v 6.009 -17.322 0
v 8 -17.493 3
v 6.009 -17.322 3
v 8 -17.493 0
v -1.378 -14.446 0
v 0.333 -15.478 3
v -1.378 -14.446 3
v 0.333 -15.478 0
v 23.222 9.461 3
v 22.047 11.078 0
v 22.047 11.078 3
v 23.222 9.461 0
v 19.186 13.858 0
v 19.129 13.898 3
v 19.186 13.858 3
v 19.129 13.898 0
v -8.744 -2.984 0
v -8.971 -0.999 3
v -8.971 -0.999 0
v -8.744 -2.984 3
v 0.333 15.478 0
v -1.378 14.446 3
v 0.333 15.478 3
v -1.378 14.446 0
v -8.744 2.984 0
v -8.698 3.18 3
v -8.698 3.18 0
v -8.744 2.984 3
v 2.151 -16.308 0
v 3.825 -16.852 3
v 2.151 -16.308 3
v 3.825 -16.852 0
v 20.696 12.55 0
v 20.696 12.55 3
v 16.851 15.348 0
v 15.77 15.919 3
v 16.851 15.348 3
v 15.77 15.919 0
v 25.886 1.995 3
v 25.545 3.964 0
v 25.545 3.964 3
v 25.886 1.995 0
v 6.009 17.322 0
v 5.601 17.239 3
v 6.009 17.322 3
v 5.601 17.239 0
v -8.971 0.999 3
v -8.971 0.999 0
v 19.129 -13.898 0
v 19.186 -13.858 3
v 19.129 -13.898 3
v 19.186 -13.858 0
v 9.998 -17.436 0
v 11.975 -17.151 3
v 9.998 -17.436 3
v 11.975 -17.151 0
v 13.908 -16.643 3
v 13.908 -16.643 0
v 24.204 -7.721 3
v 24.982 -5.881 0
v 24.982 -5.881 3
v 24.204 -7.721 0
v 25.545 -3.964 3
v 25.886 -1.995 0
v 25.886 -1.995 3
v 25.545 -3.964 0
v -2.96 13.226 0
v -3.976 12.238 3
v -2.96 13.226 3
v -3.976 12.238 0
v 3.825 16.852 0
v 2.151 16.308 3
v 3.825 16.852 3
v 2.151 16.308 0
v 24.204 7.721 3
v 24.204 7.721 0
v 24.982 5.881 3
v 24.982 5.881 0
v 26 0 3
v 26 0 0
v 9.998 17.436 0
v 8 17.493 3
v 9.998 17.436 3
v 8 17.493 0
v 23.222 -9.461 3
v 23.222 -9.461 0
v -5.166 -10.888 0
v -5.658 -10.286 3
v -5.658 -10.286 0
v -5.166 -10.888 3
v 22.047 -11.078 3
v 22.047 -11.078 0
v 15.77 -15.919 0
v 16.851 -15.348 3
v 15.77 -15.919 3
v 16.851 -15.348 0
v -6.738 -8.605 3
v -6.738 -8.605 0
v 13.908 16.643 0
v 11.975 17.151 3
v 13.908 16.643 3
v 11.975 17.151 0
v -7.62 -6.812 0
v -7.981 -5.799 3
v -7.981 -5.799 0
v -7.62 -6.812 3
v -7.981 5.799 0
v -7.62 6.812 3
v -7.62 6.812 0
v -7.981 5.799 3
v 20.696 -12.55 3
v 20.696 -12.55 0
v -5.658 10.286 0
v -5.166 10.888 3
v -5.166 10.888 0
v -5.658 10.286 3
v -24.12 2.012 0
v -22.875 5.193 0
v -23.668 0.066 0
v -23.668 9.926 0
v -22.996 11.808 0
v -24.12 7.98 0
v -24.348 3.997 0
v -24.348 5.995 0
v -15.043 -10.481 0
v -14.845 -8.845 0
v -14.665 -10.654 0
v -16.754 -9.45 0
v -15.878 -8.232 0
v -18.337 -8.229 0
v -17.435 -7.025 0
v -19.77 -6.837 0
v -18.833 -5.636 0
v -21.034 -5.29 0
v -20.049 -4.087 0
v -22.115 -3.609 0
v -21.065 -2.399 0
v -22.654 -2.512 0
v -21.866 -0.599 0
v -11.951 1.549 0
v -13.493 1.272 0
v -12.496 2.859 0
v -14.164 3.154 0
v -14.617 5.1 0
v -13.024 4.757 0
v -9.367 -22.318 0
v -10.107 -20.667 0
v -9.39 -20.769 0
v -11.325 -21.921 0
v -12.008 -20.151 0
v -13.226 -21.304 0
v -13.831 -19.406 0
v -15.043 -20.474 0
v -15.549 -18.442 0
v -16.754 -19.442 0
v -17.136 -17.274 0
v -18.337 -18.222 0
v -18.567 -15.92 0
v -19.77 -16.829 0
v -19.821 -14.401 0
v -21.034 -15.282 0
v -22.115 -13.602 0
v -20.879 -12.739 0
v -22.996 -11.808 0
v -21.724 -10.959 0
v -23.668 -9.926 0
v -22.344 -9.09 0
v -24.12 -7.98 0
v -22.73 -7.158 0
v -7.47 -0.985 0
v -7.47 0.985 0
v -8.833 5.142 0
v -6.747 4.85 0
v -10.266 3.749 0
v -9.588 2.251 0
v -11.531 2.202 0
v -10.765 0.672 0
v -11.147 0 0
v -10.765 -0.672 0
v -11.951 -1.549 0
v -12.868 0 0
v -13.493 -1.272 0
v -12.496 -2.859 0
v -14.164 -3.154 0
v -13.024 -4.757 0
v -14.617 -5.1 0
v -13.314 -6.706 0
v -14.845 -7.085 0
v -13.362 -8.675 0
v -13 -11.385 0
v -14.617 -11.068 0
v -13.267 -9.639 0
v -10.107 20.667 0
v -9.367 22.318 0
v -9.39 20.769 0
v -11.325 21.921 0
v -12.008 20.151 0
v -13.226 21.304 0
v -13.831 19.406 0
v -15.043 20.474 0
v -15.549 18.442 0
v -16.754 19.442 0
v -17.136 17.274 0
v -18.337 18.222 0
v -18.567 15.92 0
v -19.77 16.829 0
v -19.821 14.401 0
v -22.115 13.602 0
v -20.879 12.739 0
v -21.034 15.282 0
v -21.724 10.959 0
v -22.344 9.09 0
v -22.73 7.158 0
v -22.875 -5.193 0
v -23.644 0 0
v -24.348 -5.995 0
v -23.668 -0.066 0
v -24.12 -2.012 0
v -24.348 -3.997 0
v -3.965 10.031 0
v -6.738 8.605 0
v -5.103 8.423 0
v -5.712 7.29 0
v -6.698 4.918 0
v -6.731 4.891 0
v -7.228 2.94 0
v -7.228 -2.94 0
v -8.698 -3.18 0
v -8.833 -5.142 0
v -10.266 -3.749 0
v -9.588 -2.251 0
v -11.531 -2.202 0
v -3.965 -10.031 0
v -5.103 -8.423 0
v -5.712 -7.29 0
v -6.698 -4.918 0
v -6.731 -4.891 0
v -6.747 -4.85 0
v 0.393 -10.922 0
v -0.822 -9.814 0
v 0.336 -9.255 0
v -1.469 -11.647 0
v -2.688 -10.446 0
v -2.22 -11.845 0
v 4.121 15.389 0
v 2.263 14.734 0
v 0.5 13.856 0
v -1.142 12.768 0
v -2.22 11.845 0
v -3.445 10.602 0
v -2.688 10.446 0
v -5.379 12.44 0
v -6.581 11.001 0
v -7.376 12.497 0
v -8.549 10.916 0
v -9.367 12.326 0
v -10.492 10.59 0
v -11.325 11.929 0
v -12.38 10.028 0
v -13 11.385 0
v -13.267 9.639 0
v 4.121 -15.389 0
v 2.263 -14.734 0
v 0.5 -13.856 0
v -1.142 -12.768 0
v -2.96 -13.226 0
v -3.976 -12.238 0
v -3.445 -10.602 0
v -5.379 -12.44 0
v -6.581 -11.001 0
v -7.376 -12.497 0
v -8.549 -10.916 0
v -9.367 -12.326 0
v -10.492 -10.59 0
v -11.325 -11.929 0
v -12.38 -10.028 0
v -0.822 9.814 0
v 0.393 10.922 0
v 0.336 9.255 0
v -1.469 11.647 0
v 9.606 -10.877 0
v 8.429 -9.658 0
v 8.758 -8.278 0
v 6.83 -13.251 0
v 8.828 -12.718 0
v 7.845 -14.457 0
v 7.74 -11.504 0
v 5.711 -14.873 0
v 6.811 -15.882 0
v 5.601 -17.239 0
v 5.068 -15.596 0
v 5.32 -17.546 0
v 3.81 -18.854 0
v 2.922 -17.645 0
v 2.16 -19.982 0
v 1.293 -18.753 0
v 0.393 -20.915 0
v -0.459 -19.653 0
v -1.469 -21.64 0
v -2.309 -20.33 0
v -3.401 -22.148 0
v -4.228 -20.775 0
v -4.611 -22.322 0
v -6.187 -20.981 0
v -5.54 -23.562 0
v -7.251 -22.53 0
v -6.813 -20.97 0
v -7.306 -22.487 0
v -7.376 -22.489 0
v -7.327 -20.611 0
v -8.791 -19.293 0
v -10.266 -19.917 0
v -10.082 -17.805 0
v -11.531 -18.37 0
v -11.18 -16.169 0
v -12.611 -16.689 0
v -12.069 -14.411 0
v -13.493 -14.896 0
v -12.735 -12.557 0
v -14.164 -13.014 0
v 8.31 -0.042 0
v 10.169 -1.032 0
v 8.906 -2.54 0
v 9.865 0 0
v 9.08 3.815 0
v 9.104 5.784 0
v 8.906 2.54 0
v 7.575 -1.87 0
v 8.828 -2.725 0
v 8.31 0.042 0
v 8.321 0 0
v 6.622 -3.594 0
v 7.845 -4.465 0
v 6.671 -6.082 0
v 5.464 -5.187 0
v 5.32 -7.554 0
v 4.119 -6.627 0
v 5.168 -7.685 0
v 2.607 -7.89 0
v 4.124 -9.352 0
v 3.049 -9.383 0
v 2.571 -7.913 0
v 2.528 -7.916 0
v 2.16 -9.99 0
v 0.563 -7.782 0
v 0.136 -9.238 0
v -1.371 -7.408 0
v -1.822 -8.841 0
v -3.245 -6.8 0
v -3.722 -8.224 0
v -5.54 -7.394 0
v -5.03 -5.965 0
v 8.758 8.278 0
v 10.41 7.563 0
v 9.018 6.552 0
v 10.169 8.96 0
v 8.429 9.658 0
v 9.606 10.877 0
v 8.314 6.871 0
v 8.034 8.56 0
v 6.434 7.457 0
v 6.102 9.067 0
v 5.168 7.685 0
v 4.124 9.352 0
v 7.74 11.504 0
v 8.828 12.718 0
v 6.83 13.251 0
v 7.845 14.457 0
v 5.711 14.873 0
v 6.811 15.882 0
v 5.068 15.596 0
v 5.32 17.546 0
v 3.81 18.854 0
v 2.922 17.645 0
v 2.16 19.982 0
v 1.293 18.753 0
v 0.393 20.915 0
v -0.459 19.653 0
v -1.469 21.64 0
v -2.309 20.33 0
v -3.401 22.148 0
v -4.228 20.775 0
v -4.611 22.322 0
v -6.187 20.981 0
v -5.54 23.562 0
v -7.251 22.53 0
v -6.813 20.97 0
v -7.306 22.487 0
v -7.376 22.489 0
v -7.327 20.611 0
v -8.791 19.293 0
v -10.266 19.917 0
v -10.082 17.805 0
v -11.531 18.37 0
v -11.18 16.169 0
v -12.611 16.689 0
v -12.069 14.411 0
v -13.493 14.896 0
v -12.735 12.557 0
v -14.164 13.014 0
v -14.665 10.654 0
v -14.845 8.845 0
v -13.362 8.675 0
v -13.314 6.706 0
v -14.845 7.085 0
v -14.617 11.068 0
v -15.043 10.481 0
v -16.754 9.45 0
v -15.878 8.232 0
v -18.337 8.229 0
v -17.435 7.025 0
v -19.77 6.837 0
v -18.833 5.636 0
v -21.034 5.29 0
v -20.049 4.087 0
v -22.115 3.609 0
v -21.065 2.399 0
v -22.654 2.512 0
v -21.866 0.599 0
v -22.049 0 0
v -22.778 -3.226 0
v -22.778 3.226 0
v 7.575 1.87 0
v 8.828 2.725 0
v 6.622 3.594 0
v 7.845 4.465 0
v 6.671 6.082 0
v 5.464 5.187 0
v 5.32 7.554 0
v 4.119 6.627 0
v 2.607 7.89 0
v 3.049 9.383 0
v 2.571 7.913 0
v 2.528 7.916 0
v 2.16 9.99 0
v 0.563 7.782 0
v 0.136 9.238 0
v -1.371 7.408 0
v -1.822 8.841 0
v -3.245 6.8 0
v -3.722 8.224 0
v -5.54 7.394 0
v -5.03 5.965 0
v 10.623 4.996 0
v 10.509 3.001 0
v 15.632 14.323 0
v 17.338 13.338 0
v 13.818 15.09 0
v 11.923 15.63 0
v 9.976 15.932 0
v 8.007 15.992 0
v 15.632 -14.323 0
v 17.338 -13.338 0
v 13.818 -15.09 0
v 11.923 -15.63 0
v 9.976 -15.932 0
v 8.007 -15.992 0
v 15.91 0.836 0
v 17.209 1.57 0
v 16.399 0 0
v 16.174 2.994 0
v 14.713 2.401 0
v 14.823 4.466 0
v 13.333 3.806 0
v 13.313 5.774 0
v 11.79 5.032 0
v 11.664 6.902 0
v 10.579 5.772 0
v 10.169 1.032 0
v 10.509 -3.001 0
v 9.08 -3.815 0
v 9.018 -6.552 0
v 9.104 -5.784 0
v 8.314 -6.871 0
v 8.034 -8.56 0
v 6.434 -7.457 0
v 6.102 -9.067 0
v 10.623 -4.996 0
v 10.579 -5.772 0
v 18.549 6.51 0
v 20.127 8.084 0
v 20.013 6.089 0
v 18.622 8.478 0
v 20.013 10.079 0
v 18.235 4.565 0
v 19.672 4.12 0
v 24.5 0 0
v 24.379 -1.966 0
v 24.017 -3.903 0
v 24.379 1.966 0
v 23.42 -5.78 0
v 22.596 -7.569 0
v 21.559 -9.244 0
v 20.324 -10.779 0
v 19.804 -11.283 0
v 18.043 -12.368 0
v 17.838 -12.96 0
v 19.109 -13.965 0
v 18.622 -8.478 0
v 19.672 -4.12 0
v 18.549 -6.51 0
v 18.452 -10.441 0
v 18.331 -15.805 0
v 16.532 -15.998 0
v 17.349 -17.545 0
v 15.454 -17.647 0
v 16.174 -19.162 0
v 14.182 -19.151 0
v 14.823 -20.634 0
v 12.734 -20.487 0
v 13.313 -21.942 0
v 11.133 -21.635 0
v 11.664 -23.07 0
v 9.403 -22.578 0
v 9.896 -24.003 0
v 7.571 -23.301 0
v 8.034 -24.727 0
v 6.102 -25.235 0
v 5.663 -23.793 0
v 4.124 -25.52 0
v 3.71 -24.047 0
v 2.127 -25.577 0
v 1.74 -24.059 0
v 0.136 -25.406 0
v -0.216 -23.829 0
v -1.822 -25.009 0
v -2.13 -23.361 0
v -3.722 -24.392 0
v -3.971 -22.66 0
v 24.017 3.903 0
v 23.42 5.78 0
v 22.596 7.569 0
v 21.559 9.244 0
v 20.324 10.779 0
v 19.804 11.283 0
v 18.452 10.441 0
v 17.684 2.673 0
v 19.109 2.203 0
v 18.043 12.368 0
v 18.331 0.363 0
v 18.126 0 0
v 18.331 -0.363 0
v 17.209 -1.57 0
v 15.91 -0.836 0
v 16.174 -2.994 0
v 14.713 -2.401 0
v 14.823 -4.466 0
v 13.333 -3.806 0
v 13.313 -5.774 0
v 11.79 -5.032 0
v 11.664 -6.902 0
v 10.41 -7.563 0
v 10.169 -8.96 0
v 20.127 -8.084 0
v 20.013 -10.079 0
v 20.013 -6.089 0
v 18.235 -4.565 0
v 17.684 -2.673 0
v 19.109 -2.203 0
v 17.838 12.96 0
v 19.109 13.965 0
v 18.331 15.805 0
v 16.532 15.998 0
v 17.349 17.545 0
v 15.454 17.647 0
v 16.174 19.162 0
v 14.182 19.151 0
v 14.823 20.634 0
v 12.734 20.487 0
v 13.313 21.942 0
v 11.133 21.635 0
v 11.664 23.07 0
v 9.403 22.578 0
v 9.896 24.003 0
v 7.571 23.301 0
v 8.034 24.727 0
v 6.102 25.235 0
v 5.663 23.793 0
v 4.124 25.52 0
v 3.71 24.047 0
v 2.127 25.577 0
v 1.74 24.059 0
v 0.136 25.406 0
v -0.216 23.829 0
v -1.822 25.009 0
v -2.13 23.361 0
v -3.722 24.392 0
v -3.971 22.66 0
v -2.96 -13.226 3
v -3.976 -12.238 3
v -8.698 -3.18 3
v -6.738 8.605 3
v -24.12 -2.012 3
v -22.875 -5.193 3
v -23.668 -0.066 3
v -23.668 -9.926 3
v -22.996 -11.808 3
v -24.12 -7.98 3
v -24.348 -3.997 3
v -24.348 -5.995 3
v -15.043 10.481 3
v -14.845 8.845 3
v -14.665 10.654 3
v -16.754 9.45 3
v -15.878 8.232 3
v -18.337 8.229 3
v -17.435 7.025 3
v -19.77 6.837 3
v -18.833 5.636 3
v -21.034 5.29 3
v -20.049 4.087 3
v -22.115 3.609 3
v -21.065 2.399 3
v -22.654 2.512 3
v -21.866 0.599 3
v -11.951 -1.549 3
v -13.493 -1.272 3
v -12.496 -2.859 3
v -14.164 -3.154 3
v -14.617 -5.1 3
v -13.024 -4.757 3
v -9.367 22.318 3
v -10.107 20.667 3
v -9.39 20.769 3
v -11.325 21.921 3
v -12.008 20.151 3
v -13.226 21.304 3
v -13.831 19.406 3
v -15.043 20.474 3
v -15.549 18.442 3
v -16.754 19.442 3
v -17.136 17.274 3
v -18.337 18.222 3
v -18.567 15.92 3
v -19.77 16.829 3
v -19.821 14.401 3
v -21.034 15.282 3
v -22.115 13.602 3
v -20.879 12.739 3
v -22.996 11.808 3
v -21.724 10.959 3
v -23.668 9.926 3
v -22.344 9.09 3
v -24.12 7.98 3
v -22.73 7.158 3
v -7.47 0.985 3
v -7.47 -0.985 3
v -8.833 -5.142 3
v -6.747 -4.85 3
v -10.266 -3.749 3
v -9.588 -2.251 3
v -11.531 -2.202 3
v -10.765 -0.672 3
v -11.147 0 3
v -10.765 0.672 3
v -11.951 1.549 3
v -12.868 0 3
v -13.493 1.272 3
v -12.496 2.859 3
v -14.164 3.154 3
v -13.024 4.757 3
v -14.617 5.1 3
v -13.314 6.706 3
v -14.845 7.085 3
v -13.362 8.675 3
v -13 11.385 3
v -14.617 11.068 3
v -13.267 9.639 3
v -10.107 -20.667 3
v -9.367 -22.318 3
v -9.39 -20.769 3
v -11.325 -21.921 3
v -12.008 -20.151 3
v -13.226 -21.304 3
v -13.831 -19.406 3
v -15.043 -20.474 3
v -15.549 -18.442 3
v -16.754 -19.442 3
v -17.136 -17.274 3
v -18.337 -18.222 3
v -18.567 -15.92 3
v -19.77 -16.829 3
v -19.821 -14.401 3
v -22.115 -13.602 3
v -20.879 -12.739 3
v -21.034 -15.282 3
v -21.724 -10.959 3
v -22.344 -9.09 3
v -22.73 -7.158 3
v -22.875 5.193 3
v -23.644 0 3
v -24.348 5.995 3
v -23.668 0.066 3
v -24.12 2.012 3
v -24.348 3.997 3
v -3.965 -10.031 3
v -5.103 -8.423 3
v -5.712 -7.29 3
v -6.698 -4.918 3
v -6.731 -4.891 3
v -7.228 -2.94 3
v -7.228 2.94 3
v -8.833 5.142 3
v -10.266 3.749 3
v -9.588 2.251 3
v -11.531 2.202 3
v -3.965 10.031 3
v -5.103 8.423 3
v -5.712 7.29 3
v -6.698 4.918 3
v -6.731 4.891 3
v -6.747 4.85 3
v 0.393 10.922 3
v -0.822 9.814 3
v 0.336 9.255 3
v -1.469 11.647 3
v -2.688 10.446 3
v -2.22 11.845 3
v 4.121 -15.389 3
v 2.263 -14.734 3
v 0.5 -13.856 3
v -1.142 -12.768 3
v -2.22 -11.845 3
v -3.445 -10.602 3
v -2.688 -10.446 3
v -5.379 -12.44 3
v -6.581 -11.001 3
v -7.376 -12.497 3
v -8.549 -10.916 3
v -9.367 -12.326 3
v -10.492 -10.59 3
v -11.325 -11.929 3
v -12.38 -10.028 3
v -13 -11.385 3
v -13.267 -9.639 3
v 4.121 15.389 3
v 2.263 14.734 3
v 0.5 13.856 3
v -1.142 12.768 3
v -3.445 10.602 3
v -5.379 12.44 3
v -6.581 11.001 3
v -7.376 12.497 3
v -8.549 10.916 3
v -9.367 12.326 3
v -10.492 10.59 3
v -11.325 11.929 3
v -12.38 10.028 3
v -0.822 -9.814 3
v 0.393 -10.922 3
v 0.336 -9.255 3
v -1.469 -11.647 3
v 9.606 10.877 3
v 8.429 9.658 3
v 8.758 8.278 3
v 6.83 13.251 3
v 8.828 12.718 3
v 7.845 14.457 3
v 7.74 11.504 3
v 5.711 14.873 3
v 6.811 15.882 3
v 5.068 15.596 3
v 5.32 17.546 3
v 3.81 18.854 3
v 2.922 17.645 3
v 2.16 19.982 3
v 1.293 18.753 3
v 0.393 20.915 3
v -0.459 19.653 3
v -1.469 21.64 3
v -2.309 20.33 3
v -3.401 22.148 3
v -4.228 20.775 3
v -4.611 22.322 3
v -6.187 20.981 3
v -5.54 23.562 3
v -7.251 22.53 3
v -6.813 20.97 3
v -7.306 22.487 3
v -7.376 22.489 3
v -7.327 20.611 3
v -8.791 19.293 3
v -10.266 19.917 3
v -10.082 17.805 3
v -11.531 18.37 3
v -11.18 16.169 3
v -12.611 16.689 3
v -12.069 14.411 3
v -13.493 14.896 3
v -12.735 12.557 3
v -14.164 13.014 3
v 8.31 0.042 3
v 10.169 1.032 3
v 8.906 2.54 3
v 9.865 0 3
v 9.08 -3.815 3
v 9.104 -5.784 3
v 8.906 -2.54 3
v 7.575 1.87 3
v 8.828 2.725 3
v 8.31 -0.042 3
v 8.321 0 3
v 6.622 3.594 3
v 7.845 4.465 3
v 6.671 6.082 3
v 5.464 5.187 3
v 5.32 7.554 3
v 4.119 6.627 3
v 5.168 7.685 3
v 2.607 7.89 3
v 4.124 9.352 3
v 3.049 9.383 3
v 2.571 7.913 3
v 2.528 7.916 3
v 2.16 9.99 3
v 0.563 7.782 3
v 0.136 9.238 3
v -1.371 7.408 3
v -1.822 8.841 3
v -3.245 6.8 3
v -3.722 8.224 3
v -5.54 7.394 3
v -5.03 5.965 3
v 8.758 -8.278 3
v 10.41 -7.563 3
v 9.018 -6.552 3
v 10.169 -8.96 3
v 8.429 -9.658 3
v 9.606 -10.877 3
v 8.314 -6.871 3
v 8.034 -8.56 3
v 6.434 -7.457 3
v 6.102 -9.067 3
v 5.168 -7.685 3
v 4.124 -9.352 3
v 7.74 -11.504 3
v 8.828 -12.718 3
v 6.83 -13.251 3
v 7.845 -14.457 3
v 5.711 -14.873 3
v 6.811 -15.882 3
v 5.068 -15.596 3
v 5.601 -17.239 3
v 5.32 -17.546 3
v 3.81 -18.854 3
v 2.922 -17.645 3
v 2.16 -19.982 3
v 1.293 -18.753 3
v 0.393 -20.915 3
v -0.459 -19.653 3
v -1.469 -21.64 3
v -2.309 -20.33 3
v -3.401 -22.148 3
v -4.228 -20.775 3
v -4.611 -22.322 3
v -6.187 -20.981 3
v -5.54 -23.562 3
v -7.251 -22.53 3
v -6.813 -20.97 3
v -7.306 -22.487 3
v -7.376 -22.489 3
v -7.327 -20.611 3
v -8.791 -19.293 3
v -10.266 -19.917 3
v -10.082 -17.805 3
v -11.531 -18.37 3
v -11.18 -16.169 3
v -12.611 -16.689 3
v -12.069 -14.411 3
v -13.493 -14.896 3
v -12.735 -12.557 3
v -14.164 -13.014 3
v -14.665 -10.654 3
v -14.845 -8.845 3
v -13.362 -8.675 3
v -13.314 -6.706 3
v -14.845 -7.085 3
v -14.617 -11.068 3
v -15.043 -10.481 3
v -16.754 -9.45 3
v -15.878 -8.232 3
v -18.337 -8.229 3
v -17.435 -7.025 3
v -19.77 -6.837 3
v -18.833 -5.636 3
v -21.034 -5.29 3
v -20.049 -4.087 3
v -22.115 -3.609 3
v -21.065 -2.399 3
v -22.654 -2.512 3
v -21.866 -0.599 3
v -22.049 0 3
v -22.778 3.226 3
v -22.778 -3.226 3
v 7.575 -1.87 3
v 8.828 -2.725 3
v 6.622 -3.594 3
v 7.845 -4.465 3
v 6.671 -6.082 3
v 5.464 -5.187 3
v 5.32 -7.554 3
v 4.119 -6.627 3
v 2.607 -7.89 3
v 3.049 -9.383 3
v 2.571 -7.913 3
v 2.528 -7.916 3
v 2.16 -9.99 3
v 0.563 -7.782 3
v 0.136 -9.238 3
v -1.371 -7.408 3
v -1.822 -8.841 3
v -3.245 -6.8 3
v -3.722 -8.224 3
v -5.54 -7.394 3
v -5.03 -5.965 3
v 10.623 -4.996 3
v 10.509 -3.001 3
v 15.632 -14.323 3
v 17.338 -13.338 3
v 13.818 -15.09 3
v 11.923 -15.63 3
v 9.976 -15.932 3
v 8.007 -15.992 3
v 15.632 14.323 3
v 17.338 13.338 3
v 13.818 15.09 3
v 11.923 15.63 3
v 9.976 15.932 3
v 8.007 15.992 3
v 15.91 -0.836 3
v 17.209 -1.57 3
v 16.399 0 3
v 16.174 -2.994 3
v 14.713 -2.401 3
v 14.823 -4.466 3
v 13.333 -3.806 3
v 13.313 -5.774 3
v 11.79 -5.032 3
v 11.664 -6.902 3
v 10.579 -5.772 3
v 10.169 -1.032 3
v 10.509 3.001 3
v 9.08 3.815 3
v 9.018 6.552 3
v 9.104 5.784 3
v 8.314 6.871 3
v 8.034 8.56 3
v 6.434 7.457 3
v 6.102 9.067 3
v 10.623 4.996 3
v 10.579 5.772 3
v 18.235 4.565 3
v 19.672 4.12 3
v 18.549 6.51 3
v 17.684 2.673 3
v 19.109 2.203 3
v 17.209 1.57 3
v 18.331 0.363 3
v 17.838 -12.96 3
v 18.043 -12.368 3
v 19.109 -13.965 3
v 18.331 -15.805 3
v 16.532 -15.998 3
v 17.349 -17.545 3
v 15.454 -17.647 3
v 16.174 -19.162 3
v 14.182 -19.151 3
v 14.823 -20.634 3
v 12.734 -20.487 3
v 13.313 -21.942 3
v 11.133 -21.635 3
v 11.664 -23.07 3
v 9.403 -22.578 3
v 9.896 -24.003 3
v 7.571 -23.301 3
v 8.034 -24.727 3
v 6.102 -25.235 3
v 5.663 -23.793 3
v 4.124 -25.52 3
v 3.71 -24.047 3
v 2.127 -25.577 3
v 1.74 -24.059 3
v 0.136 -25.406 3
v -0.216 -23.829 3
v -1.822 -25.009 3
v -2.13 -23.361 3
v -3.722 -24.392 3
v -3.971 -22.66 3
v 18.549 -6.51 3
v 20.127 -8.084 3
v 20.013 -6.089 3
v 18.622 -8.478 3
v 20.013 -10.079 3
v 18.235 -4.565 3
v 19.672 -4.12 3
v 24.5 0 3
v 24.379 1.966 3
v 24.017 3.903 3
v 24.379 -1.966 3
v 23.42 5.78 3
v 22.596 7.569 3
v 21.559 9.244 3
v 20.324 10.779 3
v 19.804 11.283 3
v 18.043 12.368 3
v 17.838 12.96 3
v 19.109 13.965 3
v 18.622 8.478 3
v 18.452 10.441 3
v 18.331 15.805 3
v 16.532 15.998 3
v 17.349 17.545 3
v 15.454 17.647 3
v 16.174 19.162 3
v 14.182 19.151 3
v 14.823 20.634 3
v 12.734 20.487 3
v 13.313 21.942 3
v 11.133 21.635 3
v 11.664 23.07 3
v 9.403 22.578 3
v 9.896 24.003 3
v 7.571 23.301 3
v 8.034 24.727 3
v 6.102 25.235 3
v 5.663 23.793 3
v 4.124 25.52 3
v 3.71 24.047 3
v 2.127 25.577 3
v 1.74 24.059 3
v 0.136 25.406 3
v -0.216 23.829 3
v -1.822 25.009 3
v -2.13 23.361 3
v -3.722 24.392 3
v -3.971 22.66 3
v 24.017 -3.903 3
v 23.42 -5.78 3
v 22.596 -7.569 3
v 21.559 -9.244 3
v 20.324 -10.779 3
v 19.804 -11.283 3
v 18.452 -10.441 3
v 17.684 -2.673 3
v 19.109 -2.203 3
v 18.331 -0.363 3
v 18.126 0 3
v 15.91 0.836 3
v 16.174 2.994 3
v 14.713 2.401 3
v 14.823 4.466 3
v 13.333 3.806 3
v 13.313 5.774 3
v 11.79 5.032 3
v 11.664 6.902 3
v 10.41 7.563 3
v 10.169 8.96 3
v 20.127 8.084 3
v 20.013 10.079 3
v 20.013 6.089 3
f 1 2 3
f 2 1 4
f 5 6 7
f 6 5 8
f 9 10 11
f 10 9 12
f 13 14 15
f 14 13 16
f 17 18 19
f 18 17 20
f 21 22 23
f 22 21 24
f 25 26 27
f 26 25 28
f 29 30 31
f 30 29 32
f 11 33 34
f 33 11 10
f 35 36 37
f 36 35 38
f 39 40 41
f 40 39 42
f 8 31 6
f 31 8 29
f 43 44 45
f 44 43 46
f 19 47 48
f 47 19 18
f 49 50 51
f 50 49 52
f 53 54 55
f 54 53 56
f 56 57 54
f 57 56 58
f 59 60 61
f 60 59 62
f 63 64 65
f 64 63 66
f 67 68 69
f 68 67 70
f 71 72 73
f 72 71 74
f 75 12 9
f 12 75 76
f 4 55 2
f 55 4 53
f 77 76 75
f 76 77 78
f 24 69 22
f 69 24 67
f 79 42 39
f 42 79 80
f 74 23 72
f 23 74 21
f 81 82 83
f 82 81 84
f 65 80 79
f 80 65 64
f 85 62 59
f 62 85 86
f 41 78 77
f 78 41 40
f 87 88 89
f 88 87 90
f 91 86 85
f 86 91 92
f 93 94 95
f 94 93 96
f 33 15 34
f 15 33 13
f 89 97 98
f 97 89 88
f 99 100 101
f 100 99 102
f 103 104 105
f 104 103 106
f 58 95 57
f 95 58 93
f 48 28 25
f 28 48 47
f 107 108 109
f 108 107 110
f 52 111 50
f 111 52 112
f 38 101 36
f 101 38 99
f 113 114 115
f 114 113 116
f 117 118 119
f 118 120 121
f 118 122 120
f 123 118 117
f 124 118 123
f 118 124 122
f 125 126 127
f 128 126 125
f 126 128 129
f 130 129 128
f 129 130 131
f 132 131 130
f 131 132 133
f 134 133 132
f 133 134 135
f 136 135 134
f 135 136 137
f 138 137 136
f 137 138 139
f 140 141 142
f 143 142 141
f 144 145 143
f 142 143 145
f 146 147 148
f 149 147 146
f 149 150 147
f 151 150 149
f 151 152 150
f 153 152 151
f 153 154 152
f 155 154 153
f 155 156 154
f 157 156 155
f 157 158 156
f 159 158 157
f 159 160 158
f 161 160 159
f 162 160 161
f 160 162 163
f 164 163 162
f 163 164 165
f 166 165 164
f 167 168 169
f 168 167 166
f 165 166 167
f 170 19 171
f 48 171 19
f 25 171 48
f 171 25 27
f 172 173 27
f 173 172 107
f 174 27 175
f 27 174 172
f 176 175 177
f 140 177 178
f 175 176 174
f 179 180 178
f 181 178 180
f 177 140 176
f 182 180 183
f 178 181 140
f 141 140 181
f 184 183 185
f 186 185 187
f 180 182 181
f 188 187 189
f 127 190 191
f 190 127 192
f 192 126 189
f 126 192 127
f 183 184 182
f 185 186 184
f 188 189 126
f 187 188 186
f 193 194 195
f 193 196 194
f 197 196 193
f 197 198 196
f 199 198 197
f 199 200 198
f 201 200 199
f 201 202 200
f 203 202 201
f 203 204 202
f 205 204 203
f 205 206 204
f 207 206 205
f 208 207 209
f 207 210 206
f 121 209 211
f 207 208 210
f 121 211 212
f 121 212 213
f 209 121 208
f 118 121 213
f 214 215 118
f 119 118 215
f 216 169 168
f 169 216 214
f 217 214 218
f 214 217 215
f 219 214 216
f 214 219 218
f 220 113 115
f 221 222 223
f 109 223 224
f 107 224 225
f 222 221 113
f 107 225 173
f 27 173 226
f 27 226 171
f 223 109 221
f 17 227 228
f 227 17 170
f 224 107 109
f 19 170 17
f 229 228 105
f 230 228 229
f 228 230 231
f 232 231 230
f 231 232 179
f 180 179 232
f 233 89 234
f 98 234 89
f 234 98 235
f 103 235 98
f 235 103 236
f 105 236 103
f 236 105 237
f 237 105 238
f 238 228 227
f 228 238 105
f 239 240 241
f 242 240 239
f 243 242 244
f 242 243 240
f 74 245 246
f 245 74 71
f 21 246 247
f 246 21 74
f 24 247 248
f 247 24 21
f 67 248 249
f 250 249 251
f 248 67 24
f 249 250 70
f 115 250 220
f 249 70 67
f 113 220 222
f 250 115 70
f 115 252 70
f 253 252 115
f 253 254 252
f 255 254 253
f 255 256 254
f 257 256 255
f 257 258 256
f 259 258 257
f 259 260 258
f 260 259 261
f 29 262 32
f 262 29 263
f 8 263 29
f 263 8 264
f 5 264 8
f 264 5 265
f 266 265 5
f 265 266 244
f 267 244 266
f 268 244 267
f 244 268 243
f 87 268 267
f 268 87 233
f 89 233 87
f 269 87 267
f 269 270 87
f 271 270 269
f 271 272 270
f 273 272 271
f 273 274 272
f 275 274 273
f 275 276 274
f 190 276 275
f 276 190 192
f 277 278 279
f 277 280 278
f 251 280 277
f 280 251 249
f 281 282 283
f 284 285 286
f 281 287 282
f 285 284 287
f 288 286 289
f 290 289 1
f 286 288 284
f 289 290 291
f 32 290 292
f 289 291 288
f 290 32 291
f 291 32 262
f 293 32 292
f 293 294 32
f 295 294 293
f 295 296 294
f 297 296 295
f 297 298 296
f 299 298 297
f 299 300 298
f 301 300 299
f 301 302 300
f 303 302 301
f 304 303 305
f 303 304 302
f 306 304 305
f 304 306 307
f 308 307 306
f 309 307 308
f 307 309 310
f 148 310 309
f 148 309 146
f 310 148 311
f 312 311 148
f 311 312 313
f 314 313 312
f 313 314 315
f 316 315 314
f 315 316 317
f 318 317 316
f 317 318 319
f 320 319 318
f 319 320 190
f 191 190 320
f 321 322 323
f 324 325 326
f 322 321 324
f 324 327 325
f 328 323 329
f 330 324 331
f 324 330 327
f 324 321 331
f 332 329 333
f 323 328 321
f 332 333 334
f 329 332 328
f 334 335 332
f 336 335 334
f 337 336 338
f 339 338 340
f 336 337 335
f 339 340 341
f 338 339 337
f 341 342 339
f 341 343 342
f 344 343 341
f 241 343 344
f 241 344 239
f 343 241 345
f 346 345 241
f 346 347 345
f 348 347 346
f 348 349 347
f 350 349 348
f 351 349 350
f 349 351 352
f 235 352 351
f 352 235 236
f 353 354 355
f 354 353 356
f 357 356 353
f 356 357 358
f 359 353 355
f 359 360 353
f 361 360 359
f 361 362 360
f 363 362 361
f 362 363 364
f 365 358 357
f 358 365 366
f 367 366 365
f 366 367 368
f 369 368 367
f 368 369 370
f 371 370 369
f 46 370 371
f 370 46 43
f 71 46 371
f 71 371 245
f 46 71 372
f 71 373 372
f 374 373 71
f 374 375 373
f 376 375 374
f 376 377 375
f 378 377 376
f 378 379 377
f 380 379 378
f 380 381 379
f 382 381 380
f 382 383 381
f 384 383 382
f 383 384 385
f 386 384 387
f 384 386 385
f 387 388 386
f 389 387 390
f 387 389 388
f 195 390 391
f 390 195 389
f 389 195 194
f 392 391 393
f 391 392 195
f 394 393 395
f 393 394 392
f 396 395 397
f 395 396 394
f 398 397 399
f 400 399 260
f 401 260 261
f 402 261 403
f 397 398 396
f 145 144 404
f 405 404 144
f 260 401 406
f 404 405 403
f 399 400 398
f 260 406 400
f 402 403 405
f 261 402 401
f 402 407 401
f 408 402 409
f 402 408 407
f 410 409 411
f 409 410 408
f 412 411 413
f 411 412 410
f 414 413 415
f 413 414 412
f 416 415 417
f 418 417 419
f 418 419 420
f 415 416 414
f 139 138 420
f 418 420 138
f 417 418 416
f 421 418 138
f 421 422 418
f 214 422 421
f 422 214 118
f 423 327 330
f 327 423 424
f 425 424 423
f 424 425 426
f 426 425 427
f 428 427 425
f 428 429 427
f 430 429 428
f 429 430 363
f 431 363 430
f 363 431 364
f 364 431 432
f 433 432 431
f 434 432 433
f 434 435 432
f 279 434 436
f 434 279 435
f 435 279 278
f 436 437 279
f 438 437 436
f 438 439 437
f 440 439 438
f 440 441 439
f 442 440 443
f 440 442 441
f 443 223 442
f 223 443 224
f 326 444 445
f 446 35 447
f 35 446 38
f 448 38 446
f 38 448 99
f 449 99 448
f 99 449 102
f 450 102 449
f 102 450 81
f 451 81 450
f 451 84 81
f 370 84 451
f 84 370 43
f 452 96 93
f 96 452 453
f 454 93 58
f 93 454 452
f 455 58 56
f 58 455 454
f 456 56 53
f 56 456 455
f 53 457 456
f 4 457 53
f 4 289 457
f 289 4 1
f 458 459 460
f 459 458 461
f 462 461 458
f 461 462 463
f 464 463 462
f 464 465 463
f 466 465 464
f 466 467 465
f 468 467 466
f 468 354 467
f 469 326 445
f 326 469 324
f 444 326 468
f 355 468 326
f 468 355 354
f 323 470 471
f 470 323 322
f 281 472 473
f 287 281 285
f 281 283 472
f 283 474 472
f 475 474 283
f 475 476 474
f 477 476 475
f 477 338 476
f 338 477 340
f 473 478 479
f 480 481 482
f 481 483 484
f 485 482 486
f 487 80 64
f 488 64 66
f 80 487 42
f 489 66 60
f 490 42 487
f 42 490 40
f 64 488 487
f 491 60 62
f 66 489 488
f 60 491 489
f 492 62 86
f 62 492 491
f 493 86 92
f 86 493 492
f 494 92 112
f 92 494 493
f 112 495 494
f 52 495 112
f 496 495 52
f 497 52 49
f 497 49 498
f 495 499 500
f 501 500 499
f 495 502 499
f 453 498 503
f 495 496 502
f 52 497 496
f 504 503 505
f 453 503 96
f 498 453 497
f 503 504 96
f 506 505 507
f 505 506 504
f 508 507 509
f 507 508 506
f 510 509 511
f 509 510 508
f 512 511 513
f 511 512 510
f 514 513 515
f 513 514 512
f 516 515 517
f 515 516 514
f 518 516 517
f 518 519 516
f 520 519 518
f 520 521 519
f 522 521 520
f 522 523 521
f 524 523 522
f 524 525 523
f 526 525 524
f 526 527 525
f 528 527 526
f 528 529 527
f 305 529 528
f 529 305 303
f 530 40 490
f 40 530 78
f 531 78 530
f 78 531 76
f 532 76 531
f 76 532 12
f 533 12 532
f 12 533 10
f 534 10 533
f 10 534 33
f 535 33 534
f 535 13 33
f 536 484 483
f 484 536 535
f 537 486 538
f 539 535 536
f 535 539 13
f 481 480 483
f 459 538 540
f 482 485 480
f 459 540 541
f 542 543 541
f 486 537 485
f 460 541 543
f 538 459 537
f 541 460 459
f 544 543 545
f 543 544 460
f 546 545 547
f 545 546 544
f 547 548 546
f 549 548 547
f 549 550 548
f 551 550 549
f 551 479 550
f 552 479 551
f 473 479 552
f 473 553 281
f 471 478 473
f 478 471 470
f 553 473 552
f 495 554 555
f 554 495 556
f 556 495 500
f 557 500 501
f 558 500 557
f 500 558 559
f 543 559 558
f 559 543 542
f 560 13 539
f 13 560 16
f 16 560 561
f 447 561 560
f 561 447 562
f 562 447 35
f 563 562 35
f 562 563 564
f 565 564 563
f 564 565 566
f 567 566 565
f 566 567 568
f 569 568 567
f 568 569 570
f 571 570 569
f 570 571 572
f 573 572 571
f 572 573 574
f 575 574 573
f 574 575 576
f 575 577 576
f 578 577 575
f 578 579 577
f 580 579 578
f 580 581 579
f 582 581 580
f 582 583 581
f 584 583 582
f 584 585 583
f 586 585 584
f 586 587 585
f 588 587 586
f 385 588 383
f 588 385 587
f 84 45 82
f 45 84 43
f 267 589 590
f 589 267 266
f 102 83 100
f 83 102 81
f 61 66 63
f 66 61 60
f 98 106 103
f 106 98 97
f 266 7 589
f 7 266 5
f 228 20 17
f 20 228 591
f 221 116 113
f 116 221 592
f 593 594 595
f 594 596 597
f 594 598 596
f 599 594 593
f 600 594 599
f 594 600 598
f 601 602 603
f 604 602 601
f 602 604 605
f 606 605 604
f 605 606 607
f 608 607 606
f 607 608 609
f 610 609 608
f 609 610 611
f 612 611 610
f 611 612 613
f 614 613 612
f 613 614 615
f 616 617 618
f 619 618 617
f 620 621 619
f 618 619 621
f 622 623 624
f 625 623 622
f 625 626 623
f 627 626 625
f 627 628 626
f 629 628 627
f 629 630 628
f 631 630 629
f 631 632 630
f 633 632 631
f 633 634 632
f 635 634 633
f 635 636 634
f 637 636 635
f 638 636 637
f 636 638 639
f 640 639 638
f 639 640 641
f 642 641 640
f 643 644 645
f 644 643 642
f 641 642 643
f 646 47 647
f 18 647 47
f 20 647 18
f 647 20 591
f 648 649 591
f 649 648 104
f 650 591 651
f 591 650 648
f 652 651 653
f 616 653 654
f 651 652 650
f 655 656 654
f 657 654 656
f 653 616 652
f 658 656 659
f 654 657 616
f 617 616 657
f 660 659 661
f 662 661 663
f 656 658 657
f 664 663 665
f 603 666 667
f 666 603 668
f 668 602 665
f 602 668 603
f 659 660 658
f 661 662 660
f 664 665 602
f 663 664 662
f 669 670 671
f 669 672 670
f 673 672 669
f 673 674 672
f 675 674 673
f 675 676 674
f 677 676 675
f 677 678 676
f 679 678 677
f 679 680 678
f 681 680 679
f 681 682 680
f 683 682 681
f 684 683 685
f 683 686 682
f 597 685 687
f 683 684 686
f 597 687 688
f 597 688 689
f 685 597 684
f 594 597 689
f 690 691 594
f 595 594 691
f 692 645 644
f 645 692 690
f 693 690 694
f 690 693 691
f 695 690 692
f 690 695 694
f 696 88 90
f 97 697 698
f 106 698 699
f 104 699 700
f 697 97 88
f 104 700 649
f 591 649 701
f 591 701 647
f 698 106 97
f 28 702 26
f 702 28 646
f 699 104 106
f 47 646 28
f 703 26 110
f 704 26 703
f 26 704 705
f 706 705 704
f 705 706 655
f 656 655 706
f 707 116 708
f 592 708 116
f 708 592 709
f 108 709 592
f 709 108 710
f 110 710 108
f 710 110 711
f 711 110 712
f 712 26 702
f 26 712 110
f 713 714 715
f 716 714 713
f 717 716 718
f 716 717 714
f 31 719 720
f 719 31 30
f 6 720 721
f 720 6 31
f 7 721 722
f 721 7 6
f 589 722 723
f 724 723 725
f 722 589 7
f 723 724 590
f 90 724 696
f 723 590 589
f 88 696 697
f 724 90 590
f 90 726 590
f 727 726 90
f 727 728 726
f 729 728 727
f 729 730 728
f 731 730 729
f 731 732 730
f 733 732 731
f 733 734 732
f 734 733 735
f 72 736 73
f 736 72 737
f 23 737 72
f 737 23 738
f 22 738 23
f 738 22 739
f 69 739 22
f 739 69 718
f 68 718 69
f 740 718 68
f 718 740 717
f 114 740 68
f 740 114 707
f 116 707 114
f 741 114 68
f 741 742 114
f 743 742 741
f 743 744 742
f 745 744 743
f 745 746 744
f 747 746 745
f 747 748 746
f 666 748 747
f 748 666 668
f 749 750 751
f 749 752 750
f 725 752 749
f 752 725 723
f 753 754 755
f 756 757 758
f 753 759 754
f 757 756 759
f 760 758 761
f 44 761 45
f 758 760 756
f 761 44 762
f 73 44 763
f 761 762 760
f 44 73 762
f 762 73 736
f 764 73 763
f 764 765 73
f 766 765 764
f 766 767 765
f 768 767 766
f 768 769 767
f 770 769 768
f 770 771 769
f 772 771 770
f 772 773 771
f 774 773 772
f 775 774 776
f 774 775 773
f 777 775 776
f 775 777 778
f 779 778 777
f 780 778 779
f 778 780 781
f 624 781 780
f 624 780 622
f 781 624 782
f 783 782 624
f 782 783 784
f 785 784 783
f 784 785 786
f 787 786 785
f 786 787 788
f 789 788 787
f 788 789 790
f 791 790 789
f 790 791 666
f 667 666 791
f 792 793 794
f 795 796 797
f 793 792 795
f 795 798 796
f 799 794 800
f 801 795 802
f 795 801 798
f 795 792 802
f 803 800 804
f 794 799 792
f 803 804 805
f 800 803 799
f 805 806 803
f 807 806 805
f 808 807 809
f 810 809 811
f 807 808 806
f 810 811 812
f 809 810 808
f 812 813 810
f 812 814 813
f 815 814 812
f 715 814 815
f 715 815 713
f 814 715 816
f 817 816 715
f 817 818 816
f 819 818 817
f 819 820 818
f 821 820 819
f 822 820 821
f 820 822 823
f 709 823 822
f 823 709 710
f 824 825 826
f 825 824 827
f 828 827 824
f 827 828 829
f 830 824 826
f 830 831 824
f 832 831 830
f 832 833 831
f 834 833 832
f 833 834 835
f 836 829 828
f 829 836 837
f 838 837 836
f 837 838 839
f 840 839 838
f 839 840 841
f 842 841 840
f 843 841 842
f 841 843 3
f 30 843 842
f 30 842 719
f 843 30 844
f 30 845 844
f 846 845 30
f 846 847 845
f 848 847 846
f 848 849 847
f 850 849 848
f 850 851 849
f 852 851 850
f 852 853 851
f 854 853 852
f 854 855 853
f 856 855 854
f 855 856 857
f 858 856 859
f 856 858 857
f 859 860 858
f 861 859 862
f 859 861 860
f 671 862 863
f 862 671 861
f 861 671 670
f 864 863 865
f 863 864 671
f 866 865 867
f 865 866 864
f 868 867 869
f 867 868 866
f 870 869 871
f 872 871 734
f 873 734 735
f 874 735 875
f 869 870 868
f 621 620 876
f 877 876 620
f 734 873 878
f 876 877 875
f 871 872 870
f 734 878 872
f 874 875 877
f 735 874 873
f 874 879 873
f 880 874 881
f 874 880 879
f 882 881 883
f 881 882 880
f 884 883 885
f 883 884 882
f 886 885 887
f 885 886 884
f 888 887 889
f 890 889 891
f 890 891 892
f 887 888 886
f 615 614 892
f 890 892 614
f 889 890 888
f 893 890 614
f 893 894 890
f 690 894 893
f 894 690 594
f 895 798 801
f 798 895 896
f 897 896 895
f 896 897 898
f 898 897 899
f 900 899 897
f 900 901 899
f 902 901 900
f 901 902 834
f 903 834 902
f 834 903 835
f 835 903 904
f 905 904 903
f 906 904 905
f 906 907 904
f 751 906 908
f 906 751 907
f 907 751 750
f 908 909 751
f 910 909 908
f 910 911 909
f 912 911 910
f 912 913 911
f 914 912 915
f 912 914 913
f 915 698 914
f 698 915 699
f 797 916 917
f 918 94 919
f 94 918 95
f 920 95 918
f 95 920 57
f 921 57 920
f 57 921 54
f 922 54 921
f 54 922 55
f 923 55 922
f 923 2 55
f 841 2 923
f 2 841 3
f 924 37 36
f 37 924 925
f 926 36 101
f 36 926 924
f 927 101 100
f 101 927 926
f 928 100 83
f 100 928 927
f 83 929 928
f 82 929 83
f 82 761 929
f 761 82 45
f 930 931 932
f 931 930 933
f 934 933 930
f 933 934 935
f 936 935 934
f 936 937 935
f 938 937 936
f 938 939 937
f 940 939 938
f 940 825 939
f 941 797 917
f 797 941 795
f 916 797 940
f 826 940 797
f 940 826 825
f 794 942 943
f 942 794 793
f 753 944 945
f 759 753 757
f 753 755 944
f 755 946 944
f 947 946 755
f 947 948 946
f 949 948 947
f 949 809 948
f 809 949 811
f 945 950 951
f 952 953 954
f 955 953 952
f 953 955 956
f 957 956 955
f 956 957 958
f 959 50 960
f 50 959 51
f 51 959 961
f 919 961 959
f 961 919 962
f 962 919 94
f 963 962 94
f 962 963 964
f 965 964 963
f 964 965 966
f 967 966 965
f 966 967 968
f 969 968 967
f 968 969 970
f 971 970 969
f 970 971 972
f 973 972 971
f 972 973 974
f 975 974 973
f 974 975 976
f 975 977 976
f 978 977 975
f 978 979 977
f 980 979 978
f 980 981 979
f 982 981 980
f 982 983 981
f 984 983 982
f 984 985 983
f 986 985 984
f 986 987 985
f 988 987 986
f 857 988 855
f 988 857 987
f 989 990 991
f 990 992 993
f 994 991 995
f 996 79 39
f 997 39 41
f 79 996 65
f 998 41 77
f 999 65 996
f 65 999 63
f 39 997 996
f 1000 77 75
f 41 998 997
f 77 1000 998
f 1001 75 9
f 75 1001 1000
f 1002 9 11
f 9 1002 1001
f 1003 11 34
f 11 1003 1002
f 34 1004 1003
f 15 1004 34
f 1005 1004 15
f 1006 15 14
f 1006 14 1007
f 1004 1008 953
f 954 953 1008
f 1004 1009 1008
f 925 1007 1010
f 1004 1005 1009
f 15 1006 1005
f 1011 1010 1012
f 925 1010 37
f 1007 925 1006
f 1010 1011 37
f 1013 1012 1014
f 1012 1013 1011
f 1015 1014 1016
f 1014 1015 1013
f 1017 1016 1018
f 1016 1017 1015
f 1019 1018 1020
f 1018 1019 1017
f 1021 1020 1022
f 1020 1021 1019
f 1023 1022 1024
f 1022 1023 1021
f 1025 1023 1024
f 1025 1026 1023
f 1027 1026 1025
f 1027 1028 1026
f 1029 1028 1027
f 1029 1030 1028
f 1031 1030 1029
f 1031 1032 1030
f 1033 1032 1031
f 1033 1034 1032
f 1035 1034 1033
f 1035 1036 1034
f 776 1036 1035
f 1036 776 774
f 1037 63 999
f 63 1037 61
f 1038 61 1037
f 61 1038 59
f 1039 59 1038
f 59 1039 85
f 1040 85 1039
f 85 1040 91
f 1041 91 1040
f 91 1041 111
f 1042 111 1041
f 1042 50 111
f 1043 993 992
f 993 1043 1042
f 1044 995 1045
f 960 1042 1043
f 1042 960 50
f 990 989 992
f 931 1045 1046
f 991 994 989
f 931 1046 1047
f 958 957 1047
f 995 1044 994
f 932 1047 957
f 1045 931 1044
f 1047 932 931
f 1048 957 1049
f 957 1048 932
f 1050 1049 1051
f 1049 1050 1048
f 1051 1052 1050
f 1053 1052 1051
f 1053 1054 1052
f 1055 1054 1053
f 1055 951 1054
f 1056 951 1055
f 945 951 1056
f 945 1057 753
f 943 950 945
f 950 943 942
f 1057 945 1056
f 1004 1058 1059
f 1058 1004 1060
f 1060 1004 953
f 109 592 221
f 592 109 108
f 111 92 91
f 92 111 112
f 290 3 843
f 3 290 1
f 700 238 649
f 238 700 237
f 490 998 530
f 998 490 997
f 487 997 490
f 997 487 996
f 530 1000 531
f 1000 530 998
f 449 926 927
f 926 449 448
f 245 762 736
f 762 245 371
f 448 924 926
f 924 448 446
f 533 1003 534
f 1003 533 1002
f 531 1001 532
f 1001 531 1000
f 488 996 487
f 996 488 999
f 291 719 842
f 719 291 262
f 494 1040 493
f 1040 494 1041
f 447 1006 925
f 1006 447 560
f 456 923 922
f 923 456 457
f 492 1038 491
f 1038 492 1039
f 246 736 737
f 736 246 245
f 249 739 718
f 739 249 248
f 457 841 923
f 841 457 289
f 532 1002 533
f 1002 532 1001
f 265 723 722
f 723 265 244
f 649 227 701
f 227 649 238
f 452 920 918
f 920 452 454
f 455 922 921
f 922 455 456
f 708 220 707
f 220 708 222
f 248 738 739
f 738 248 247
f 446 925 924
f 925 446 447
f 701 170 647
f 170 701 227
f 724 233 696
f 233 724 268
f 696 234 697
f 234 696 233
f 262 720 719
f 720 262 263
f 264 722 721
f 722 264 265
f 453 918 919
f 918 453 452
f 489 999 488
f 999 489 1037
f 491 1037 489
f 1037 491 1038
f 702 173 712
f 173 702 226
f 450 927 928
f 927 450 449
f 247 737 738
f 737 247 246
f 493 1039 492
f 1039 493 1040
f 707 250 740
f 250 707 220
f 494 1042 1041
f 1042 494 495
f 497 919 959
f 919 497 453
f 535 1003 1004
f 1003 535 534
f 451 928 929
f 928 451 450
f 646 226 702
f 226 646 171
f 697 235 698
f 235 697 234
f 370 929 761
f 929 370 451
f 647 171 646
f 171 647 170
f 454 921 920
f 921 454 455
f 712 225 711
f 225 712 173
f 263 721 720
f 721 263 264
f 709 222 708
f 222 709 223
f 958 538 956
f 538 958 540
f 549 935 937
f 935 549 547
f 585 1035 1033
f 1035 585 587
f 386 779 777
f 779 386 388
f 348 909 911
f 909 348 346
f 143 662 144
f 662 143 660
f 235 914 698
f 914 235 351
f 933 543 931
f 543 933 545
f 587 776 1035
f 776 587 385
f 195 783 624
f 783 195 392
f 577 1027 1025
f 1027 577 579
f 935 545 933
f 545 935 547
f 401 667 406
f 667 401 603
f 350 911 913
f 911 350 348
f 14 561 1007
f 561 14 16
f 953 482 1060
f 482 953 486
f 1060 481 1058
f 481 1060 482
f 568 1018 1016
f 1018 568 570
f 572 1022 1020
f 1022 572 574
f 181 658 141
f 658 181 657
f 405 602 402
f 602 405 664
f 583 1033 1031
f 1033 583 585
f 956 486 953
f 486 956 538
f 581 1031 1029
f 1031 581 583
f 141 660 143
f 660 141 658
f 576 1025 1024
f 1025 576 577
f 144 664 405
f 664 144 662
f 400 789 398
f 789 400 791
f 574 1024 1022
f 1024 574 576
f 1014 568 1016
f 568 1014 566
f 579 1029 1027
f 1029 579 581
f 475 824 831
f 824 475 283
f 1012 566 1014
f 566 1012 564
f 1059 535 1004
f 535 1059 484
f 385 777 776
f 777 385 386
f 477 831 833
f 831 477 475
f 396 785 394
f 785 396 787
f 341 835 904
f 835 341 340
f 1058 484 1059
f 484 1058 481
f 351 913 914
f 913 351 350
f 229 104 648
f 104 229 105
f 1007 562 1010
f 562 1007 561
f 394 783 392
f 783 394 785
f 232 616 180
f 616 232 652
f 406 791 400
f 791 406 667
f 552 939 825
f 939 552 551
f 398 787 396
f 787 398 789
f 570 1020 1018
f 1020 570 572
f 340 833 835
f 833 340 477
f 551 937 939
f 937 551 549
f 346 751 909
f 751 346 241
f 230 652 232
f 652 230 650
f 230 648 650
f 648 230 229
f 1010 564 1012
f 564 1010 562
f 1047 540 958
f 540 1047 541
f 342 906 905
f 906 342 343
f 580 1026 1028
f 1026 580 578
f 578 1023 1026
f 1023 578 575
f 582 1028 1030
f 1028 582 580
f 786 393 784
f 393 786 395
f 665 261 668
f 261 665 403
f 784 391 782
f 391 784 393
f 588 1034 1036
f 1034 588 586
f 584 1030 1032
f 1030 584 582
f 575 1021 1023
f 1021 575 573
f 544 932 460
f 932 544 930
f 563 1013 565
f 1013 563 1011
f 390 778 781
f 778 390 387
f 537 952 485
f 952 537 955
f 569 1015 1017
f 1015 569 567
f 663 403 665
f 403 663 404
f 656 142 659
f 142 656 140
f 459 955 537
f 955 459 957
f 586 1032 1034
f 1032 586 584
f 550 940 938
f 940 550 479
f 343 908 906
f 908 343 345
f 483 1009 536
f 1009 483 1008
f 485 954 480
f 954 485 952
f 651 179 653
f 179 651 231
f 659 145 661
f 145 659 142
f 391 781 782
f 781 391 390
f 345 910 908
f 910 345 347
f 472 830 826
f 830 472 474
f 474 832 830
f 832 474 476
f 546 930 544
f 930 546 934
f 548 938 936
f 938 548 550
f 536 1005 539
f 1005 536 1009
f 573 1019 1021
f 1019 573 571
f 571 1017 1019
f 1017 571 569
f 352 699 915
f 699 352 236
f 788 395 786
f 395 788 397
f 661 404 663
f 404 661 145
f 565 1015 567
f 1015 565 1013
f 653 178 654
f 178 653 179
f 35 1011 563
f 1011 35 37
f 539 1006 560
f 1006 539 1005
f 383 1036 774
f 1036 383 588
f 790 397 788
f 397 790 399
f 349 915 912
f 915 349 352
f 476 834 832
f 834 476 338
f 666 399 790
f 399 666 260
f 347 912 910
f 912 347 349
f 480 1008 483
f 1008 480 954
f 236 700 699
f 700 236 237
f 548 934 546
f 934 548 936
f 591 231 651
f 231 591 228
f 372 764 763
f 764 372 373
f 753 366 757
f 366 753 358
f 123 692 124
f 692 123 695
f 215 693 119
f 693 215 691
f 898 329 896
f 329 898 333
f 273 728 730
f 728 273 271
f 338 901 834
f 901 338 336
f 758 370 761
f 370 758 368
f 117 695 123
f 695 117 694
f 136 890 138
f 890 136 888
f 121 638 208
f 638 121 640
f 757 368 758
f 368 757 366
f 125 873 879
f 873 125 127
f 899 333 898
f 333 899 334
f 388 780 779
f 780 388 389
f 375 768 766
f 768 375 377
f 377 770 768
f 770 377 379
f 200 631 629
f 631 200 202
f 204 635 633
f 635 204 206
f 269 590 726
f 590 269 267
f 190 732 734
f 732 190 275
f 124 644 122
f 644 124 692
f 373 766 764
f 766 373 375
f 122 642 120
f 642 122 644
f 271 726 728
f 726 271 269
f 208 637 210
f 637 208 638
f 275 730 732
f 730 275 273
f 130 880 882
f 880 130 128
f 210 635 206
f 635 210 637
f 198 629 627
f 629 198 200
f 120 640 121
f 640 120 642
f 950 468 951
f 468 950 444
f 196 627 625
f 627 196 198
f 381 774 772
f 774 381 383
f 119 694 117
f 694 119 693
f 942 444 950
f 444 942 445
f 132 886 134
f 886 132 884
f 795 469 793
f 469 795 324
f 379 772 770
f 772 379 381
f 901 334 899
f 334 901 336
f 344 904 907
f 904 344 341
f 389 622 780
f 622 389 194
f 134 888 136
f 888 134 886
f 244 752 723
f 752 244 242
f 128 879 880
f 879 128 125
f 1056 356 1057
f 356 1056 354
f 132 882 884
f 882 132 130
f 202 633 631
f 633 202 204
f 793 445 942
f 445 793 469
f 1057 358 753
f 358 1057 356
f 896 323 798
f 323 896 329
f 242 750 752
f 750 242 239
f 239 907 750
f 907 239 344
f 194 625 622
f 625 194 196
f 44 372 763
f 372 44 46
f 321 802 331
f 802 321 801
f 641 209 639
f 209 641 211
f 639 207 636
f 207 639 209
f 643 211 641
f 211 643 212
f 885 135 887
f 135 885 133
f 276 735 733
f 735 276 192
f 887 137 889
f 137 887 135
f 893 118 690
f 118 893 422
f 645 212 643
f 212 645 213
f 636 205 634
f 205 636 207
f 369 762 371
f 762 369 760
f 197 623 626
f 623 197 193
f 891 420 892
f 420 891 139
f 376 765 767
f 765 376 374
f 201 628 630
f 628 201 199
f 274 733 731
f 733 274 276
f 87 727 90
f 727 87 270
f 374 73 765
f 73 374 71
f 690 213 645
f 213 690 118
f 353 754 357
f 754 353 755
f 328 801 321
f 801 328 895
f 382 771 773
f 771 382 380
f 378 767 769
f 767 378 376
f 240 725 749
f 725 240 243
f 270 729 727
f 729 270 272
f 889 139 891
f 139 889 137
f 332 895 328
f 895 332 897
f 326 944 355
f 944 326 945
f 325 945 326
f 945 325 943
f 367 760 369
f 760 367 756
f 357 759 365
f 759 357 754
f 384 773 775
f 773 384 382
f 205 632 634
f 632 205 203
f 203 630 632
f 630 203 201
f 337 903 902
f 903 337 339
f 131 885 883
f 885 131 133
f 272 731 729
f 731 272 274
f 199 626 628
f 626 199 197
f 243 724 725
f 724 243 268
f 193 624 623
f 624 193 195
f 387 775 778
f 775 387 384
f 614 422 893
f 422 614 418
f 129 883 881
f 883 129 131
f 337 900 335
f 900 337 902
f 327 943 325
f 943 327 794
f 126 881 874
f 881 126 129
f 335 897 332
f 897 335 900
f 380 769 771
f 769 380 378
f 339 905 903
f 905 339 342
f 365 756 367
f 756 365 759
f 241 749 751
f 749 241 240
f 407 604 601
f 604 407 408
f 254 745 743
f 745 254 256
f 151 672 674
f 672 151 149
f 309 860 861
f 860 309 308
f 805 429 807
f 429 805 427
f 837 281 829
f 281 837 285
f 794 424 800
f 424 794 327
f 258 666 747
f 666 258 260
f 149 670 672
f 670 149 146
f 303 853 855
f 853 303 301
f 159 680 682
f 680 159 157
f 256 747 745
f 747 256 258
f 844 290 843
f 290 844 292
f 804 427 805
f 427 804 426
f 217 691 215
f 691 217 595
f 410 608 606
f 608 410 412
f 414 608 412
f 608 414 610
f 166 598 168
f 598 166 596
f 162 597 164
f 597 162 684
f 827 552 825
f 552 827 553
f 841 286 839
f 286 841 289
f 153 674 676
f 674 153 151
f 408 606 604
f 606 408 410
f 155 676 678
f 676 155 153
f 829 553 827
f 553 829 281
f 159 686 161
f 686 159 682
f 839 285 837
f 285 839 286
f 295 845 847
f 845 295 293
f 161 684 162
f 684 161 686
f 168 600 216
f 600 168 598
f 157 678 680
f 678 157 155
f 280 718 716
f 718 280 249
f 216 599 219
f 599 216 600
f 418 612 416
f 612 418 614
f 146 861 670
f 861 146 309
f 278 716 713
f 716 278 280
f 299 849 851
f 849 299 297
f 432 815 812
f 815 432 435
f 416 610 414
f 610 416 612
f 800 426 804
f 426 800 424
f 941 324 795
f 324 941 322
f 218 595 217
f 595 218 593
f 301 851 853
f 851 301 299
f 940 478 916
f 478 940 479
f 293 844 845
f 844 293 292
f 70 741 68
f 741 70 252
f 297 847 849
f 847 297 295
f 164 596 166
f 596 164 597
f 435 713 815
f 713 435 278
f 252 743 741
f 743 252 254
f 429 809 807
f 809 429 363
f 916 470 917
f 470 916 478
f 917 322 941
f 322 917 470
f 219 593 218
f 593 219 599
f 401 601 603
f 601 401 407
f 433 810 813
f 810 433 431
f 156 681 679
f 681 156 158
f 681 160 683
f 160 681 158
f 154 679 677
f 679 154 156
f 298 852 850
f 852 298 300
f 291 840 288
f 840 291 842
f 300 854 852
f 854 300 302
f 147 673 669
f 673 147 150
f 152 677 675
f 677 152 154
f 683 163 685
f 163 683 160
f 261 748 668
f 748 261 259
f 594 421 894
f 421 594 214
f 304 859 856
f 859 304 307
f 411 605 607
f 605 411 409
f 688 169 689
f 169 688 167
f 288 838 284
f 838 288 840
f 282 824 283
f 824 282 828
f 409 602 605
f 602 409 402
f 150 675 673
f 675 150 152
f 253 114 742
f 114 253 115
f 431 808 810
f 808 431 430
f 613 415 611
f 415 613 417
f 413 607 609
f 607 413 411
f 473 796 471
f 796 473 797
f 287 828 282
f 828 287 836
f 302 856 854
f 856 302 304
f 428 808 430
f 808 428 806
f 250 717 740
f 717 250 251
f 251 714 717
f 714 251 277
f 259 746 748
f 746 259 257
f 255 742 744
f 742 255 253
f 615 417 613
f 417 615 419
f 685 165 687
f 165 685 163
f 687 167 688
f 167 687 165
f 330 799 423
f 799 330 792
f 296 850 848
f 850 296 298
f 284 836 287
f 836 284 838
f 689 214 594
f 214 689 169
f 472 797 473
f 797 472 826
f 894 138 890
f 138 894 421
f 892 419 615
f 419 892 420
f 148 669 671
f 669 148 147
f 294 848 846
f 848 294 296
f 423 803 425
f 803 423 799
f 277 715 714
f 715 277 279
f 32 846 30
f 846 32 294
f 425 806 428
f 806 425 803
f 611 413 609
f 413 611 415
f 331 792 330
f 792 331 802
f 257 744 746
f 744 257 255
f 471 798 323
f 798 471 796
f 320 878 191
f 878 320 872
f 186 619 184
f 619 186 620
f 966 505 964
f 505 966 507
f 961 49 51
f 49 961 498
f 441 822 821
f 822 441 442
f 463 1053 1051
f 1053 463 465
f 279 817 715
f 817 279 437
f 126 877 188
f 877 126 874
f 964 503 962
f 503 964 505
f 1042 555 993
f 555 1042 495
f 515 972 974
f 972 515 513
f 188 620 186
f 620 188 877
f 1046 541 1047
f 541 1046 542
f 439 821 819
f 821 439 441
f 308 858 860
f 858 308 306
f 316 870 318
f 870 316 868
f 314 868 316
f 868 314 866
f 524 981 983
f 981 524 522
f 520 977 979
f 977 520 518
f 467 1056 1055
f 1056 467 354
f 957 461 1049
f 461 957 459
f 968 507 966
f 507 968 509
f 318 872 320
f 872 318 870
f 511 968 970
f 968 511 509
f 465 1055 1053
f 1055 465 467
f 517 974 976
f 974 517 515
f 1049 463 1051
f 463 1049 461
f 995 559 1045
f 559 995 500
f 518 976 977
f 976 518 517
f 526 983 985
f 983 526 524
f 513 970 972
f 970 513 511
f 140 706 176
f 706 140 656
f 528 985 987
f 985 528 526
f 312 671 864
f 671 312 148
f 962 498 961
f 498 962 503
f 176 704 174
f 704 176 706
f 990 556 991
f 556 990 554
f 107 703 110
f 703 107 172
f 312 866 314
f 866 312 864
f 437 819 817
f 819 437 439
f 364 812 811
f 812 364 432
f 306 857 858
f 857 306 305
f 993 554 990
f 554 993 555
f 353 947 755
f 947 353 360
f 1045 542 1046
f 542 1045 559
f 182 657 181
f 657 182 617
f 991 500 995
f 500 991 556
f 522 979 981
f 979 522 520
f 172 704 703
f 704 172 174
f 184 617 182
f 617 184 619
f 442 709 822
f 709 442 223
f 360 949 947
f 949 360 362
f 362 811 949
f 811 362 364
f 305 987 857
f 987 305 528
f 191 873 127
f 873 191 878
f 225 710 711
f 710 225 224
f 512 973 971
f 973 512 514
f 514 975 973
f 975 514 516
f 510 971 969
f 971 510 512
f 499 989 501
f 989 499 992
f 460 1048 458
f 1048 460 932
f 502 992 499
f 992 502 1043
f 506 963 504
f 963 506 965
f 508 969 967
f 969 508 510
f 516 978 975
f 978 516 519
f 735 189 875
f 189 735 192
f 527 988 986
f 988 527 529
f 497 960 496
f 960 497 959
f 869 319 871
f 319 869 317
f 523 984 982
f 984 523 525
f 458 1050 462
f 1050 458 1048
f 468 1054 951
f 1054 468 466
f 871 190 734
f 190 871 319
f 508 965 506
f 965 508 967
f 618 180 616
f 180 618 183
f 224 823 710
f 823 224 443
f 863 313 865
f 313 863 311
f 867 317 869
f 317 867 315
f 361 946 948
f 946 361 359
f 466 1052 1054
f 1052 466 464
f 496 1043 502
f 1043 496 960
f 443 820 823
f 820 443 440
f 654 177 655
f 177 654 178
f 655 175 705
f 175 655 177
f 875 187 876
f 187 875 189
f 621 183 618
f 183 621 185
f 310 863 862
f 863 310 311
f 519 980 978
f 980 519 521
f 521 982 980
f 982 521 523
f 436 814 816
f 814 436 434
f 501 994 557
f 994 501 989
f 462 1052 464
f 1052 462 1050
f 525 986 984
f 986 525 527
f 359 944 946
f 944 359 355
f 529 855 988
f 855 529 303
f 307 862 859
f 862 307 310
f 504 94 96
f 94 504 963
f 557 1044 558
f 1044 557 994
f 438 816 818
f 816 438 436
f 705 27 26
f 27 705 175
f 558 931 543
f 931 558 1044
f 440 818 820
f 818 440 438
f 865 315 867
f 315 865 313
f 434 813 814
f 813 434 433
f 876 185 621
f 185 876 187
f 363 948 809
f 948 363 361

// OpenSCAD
$fa = 1;
ep = 3;

module cercle(rext) {
	difference() {
		cylinder(ep, rext, rext, true);
		cylinder(ep, rext-1.5, rext-1.5, true);
	}
}

translate([0,0,ep/2]) {

//	cercle(26);

	for(i =[0:72:360]) {

		rotate(i, [0,0,1]) translate([8.5, 0, 0]) cercle(17.5);
	}

}
